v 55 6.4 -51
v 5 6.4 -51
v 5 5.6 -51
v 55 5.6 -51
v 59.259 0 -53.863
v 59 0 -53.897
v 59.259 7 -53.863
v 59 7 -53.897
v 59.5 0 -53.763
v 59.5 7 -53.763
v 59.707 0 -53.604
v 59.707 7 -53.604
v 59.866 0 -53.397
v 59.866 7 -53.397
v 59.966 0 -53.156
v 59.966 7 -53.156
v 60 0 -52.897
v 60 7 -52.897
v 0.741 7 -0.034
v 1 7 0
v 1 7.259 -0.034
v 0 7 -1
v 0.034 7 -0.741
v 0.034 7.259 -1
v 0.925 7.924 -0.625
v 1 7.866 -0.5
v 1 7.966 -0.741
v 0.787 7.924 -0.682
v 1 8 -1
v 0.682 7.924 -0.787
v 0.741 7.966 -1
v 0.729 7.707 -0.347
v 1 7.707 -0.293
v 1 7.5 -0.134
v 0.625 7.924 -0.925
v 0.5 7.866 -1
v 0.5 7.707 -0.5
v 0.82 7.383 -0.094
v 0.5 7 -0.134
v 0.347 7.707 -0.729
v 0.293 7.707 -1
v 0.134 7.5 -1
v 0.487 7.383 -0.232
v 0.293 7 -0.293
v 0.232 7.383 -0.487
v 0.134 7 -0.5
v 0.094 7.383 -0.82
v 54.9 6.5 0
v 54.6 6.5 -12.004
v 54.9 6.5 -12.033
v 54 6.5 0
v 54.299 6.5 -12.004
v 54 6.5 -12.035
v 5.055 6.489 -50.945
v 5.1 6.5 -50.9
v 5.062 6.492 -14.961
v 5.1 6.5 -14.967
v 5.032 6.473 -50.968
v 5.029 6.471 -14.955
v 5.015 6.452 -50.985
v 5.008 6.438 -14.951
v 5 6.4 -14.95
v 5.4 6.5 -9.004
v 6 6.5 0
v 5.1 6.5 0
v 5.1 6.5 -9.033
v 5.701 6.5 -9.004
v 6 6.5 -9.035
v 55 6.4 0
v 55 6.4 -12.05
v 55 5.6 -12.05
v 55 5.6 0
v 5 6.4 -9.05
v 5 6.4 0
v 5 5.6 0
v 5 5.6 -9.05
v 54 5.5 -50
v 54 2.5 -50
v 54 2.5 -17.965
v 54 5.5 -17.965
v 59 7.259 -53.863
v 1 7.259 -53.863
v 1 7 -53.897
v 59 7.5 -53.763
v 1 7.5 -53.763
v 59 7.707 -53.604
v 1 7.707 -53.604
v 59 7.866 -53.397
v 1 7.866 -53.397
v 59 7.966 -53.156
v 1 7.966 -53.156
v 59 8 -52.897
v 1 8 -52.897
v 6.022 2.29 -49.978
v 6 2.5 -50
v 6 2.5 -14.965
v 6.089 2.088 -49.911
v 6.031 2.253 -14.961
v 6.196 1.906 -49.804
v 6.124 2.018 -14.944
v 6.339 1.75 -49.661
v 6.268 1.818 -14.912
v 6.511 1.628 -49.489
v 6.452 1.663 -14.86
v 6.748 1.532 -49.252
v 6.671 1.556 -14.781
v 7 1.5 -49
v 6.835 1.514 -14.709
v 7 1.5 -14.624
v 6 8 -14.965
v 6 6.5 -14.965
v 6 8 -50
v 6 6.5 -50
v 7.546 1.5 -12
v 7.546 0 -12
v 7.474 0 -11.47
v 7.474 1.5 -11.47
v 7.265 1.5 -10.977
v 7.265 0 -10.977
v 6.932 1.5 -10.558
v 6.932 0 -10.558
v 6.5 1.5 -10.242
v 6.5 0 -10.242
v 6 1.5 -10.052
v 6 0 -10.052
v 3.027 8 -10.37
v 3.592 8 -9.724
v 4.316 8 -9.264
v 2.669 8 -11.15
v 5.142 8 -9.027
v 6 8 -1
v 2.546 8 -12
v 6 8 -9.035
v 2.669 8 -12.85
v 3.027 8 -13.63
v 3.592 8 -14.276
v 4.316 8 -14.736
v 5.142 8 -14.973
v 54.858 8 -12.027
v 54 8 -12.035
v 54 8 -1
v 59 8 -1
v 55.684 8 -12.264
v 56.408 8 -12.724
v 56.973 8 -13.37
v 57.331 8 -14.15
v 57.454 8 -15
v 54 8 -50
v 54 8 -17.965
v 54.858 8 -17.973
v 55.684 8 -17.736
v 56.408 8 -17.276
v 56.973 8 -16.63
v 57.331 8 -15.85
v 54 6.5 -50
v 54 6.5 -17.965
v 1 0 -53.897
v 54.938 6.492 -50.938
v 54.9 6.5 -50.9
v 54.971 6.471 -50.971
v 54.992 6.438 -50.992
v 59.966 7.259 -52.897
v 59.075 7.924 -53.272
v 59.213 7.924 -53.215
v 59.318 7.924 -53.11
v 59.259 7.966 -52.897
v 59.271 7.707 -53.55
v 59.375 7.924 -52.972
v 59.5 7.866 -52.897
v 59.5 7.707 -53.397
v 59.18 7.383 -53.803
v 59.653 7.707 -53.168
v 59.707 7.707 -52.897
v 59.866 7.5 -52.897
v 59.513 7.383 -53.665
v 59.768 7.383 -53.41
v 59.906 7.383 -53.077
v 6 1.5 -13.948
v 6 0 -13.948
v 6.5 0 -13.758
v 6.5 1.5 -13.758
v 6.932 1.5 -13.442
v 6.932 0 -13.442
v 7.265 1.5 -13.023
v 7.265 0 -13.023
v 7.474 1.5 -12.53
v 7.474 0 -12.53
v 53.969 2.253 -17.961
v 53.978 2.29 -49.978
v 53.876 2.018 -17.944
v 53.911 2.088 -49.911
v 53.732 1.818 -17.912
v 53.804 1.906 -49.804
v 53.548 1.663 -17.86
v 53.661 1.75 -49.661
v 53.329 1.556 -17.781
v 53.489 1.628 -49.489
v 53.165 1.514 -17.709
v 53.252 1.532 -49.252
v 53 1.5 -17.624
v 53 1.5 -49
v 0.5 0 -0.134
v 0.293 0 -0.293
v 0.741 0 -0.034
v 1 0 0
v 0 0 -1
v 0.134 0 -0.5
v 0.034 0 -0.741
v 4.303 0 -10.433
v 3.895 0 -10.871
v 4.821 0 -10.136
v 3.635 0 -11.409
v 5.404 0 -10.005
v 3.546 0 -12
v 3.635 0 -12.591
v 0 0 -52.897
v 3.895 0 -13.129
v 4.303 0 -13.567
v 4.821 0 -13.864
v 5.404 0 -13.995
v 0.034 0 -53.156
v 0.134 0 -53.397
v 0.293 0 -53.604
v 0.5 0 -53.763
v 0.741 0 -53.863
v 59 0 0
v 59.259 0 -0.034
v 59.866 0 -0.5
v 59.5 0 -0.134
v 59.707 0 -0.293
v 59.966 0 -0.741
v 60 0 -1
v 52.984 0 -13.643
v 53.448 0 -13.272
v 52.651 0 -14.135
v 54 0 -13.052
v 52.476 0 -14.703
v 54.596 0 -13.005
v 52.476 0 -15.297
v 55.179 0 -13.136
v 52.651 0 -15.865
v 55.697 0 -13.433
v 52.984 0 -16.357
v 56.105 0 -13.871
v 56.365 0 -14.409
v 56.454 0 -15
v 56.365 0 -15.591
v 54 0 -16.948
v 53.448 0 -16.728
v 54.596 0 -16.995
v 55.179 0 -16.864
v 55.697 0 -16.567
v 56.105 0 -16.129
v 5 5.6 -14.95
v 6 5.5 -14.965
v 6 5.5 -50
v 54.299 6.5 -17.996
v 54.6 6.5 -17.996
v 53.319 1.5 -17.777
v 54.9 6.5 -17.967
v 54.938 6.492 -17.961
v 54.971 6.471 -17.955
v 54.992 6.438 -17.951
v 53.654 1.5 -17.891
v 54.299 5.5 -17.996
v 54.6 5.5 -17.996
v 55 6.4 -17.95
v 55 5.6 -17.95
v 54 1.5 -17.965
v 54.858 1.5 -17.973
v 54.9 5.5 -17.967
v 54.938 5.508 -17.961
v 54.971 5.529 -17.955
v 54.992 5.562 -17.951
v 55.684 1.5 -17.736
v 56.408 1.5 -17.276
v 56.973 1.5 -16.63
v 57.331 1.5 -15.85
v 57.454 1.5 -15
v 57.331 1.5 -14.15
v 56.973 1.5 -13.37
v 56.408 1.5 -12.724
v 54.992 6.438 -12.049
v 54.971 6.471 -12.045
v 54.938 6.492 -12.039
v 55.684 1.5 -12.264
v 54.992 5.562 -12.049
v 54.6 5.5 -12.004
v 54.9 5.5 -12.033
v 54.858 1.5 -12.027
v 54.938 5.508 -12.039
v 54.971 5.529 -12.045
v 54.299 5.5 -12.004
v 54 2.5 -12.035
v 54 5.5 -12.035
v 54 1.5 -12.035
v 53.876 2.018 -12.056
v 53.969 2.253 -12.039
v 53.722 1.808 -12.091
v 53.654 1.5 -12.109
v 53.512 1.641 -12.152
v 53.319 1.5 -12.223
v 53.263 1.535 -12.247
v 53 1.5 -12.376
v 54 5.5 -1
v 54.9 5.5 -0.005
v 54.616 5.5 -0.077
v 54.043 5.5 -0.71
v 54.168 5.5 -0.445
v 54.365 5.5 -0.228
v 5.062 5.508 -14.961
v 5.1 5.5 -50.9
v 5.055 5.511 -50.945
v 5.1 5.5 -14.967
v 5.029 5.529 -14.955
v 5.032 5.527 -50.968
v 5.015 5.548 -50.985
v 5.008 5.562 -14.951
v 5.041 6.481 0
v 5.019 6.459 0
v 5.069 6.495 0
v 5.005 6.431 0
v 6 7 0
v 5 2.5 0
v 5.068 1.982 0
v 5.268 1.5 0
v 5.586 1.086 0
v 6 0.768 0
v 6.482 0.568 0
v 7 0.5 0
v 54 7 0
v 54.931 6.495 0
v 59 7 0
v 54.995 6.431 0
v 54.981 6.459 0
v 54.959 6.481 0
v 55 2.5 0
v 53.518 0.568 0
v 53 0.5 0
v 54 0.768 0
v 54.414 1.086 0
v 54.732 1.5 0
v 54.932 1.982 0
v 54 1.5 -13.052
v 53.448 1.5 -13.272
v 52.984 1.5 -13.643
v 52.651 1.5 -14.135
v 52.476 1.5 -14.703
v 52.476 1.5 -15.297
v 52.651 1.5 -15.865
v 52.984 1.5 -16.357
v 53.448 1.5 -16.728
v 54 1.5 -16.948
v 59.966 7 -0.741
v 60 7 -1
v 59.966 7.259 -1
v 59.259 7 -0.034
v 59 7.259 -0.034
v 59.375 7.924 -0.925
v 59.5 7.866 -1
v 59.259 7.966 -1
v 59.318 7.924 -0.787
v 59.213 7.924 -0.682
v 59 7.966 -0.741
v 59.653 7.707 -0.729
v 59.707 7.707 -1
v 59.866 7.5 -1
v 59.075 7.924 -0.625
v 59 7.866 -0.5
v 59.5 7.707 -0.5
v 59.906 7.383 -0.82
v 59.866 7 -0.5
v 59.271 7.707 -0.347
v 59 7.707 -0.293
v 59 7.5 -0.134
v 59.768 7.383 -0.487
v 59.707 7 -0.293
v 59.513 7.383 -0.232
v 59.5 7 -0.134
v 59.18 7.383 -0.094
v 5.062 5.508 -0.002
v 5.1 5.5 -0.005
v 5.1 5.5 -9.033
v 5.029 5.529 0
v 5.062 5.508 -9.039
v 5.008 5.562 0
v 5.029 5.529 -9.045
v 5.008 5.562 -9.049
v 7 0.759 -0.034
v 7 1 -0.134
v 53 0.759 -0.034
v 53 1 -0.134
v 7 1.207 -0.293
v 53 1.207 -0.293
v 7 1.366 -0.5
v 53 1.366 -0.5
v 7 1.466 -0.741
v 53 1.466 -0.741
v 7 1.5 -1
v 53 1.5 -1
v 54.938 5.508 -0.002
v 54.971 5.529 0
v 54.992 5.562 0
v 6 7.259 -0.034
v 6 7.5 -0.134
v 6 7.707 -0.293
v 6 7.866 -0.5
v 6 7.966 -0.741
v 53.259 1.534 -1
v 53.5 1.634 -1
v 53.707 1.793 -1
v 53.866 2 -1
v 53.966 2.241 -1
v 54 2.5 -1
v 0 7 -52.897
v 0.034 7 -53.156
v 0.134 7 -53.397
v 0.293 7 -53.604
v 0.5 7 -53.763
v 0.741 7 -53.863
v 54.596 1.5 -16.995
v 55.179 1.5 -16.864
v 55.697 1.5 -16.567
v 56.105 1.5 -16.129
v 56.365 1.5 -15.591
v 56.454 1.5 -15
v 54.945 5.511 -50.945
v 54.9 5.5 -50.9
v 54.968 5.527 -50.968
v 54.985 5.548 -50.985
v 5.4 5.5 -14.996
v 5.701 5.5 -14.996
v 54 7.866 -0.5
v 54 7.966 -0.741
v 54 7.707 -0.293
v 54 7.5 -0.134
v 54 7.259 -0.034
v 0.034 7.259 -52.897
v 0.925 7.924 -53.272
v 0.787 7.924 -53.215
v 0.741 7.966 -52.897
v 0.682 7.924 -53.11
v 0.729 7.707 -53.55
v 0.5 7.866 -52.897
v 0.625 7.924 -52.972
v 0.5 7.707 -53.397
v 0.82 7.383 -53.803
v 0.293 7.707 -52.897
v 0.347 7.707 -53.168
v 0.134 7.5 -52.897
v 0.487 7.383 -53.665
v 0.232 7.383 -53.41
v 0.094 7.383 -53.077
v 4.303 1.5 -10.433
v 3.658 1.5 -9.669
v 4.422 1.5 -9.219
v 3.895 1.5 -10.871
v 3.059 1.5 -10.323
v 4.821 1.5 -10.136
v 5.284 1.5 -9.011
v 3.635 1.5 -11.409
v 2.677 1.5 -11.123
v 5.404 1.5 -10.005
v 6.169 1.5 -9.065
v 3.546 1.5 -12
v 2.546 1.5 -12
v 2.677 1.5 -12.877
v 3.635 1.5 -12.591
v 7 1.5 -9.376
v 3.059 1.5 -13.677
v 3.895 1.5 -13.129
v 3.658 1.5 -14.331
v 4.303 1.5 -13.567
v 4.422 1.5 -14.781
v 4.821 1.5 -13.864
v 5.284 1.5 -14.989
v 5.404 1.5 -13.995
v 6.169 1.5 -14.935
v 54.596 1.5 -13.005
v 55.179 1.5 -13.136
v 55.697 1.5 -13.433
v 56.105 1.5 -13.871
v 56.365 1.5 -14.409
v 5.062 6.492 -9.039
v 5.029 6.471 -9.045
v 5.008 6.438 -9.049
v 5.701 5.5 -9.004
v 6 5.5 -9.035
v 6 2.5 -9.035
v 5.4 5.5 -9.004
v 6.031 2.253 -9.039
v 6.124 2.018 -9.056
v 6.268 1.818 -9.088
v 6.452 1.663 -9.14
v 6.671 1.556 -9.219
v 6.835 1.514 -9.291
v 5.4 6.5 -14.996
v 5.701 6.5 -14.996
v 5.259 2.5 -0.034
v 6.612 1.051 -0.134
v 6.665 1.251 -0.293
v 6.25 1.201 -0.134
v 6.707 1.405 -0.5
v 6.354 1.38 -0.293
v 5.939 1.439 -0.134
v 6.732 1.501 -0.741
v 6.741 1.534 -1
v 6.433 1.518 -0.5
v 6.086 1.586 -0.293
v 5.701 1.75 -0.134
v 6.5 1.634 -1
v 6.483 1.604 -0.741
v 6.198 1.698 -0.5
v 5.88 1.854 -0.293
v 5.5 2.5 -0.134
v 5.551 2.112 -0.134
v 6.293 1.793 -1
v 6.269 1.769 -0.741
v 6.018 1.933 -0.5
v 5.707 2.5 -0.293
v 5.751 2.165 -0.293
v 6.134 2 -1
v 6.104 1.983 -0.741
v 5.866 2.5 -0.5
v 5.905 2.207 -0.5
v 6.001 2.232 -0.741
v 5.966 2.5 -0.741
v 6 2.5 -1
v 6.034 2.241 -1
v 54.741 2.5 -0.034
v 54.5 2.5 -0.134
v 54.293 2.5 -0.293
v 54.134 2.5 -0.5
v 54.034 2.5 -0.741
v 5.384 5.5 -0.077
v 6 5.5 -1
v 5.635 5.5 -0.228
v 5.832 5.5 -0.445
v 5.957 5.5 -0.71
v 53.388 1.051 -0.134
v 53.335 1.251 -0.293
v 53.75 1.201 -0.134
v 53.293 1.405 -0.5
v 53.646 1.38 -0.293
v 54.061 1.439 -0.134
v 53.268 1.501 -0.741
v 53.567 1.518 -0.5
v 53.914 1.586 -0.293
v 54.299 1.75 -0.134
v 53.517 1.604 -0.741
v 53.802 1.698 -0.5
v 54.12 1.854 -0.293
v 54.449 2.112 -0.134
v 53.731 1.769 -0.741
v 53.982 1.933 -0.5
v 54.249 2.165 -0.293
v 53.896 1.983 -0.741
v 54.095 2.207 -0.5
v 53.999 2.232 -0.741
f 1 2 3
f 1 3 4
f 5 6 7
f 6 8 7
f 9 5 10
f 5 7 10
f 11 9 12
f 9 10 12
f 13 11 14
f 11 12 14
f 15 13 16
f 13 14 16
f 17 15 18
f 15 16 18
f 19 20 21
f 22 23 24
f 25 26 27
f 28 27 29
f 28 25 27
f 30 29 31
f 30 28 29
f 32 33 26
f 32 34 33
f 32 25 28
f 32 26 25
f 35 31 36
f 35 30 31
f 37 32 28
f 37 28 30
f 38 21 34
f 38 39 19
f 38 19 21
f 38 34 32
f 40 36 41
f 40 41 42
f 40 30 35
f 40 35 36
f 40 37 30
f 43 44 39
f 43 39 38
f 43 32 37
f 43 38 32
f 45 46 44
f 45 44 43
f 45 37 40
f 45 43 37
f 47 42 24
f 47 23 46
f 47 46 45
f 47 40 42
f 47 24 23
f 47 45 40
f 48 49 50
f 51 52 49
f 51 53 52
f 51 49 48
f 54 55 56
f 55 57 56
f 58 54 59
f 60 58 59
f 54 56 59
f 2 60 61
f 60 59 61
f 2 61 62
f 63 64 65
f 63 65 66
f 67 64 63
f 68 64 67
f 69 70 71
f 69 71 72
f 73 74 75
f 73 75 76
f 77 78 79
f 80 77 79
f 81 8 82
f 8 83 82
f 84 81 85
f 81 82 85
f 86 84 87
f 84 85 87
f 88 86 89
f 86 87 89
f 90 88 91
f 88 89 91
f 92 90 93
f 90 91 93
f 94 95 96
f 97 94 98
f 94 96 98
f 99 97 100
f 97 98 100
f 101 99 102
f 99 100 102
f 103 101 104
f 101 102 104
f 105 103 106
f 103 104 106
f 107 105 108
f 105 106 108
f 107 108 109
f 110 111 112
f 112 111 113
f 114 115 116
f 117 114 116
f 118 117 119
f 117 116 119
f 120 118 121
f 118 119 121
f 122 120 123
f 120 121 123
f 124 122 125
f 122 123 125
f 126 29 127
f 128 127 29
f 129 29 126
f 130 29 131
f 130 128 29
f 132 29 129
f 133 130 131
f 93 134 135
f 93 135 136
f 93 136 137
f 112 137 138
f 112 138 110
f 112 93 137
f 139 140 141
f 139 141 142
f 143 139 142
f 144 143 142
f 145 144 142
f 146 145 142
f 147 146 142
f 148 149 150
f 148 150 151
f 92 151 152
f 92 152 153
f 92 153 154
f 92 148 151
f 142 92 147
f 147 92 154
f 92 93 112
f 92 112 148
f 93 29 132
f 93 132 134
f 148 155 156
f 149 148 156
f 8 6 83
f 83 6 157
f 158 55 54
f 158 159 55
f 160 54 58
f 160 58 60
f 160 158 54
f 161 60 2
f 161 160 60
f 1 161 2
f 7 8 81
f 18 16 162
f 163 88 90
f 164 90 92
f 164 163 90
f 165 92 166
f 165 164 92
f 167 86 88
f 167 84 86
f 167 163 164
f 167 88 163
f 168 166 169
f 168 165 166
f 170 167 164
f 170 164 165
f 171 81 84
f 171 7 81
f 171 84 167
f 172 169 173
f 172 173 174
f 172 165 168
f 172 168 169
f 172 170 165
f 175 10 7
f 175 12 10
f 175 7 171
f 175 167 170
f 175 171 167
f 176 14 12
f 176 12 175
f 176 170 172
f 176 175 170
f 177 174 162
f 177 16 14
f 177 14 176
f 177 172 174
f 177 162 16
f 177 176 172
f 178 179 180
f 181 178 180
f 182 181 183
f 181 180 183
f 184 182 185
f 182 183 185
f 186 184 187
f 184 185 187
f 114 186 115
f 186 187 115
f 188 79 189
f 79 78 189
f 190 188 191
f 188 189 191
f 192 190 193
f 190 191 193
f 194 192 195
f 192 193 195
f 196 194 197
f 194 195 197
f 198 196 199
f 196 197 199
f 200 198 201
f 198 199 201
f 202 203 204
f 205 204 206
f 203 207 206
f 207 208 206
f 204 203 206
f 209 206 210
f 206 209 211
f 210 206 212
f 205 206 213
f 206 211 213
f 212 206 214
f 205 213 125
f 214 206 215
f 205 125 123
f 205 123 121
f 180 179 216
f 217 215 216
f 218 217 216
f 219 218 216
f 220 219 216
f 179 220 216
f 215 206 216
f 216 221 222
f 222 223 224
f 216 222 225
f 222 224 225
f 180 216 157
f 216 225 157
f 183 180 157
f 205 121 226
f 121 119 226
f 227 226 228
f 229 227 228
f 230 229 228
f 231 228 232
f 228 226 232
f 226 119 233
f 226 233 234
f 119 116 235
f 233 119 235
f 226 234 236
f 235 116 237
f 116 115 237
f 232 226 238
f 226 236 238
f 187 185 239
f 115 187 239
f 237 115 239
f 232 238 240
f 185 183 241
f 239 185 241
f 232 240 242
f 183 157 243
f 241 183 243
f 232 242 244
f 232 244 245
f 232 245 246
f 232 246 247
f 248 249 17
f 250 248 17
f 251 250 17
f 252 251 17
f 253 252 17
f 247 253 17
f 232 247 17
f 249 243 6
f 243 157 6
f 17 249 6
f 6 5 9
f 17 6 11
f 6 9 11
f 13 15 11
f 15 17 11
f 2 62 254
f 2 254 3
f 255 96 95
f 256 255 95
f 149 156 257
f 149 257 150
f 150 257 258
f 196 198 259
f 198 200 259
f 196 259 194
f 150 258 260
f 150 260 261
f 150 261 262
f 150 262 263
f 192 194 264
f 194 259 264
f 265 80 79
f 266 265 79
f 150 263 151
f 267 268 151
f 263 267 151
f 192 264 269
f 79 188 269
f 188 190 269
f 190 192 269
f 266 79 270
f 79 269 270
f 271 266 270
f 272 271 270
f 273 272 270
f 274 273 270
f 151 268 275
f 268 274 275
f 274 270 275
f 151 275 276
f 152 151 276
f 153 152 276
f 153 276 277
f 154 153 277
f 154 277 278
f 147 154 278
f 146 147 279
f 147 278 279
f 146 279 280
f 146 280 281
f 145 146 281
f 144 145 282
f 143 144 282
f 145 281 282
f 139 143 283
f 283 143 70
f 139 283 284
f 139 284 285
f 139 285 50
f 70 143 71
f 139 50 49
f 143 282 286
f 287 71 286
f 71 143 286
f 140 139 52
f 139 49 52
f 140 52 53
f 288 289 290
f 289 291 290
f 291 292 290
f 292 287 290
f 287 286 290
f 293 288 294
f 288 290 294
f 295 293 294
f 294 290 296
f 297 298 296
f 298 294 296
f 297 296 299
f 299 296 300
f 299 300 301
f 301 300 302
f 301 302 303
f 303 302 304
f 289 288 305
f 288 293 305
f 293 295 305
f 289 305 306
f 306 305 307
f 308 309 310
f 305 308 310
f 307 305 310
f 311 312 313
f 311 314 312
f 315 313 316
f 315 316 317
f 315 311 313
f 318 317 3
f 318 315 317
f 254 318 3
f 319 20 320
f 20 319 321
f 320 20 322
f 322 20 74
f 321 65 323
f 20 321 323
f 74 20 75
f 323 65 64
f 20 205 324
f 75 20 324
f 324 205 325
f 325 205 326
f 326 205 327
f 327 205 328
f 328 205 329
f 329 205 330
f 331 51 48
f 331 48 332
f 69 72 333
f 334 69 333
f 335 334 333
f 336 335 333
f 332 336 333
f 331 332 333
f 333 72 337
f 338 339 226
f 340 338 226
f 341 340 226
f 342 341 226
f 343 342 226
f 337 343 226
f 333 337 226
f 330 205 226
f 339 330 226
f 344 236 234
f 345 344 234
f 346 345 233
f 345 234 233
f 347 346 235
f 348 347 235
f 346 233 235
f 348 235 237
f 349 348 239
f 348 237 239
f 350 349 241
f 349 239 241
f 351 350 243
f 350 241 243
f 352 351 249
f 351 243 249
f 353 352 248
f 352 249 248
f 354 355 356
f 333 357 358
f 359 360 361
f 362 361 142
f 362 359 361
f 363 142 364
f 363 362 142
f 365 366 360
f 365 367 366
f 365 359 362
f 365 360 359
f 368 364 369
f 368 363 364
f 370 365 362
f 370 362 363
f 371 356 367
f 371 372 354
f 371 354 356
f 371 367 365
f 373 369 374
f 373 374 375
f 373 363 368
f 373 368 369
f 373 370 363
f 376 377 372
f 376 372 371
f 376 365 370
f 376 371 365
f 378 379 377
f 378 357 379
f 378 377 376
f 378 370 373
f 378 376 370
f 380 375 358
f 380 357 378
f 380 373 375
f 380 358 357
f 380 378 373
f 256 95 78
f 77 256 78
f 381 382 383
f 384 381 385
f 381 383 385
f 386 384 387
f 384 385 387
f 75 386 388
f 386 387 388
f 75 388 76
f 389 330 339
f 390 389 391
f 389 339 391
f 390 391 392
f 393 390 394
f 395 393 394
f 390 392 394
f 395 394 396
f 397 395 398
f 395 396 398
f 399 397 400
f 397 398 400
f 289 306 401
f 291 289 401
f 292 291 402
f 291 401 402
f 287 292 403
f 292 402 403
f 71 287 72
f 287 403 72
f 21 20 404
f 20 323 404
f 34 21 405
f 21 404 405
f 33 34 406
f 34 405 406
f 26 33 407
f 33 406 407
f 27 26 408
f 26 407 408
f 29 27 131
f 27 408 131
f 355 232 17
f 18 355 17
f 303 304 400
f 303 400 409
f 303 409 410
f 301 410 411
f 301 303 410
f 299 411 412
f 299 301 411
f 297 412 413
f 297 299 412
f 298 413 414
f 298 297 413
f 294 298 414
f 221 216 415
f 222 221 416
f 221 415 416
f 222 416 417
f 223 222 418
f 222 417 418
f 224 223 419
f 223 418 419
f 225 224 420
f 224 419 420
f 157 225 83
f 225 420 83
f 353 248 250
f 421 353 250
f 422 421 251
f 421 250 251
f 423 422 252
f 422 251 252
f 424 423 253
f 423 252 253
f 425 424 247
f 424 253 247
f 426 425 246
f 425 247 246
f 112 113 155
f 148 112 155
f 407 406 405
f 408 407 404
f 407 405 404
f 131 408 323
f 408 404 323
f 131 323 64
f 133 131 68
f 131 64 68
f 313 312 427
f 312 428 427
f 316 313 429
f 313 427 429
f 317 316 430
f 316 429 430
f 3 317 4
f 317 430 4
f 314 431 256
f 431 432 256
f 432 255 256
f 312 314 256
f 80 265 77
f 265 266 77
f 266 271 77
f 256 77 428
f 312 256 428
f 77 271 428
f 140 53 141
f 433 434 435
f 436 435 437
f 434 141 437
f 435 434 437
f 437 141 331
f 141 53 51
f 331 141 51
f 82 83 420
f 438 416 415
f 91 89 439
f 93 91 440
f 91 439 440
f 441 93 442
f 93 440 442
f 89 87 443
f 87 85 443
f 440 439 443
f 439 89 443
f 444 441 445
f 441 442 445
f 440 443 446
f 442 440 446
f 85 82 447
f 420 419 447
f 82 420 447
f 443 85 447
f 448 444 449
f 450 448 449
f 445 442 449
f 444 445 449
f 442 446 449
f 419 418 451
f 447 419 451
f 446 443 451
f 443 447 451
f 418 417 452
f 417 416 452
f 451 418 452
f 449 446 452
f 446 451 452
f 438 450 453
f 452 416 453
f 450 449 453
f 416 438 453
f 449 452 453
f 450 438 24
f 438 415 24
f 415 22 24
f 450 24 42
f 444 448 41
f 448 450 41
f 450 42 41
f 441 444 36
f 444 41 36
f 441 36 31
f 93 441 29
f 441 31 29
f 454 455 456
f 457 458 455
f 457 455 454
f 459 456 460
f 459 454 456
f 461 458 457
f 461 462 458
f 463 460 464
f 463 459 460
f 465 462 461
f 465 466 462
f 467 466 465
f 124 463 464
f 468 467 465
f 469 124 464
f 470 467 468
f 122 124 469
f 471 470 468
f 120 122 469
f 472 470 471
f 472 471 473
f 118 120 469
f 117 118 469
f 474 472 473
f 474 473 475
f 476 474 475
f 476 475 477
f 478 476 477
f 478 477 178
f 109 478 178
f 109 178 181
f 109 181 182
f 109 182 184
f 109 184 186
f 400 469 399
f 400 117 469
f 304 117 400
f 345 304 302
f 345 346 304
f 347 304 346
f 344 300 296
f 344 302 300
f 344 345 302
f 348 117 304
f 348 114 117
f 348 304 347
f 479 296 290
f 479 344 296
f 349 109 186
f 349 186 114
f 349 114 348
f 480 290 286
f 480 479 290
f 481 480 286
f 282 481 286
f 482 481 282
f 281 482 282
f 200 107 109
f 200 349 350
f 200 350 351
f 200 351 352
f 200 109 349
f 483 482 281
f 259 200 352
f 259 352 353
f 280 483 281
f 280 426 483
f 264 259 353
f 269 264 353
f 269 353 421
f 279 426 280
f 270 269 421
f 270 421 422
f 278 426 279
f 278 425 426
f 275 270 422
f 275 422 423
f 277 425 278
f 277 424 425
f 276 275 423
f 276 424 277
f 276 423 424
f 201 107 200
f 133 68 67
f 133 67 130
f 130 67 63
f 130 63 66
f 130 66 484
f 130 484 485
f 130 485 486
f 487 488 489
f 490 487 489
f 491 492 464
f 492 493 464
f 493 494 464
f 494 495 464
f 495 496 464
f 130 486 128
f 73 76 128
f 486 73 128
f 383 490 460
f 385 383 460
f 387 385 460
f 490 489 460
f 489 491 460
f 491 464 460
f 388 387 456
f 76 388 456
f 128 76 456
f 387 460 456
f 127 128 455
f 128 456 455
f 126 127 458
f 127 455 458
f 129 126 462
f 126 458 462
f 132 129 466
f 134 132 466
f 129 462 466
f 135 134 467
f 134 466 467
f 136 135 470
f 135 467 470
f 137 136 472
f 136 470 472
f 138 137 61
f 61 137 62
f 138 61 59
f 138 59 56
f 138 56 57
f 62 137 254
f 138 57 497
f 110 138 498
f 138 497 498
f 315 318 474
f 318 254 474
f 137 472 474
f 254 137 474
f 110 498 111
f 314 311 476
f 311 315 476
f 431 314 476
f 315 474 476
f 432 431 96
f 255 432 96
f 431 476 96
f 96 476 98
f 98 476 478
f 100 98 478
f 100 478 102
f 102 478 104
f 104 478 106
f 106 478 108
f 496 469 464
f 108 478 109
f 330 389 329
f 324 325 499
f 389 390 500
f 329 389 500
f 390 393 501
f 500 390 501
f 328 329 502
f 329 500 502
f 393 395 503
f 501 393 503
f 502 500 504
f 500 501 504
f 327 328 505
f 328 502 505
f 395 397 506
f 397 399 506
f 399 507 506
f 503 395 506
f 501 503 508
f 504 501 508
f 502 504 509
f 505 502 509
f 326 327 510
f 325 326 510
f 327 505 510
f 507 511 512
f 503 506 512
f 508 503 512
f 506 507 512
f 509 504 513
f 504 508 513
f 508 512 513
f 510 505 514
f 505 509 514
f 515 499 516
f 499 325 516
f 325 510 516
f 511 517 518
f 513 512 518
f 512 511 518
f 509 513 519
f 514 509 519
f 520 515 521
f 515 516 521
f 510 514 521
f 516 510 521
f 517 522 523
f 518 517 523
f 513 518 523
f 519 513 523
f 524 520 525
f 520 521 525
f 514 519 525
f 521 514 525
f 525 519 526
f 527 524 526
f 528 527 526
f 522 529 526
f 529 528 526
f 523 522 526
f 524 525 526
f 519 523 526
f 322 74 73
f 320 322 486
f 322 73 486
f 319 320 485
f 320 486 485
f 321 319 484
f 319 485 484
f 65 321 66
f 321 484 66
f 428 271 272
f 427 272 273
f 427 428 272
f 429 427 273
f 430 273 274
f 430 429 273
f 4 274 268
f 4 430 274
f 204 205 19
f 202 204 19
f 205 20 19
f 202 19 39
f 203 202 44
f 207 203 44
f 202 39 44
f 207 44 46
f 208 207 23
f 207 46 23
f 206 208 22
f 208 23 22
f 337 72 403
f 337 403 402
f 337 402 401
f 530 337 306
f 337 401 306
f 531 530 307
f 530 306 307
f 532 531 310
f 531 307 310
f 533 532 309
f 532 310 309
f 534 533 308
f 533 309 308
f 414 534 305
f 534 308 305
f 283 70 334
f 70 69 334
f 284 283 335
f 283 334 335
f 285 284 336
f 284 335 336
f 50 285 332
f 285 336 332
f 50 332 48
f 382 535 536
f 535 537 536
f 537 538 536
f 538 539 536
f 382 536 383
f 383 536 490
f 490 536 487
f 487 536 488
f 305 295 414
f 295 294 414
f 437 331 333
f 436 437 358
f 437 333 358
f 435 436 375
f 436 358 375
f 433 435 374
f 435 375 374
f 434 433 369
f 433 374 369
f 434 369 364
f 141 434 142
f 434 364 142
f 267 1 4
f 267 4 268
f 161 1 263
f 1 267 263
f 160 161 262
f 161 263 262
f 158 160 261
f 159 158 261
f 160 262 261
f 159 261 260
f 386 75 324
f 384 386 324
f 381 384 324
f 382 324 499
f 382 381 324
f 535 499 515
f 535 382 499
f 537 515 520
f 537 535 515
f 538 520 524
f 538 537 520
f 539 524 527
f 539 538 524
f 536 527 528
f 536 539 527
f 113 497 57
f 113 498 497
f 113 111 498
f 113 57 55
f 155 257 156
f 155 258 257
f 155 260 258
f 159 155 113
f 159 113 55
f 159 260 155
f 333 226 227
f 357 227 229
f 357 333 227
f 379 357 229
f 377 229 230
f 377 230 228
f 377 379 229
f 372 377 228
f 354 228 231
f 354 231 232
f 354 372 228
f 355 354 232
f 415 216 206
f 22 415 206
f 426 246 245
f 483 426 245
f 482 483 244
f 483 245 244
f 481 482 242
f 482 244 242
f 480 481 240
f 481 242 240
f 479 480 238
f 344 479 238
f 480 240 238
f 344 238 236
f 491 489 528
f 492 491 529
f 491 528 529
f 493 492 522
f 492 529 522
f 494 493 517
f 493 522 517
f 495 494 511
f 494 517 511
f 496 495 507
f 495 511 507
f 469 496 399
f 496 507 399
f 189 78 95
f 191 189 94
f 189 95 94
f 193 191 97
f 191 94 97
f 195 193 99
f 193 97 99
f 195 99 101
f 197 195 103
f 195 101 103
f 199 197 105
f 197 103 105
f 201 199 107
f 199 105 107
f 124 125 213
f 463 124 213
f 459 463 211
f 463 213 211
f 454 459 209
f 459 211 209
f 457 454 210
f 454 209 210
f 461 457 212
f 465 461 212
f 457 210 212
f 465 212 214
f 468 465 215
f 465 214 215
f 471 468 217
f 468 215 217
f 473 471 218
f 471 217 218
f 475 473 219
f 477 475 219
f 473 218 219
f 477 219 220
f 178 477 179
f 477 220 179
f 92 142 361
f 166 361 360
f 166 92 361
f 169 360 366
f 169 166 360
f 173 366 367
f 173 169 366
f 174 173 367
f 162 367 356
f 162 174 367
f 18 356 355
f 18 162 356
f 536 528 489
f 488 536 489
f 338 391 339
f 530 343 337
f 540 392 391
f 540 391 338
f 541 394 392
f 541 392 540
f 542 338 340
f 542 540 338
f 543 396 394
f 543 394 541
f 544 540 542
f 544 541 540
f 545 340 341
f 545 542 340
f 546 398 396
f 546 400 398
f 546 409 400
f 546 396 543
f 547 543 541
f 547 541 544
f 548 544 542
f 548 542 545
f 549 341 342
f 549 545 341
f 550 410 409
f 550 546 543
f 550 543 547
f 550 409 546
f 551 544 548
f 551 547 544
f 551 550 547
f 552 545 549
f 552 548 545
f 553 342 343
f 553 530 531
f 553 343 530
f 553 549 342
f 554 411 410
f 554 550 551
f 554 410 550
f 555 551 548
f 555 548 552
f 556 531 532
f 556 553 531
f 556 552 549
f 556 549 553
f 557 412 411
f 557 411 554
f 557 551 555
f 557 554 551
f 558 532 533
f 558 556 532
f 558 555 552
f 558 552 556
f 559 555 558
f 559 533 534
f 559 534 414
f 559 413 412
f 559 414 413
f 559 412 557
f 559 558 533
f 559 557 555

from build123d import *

# Parameters (mm, degrees)
BOSS_EXTRUDE1_DEPTH = 1.5
BOSS_EXTRUDE4_DEPTH = 8
SKETCH6_W           = 50
SKETCH6_H           = 1
CUT_EXTRUDE1_DEPTH  = 1
SKETCH10_W          = 50
SKETCH10_H          = 1
CUT_EXTRUDE2_DEPTH  = 1
SKETCH11_W          = 50
SKETCH11_H          = 1
CUT_EXTRUDE3_DEPTH  = 1
FILLET1_R           = 1
FILLET2_R           = 0.1


with BuildPart() as part:
    # Sketch2 → Boss-Extrude1 (new body)
    with BuildSketch(Plane(origin=(0, 0, 0), x_dir=(1, 0, 0), z_dir=(0, 1, 0))):
        with BuildLine():
            Line((6, 9.034557534), (6, 0))
            Line((6, 0), (54, 0))
            Line((54, 0), (54, 12.034557534))
            ThreePointArc((54, 12.034557534), (51.454038521, 15), (54, 17.965442466))
            Line((54, 17.965442466), (54, 50))
            Line((54, 50), (6, 50))
            Line((6, 50), (6, 14.965442466))
            ThreePointArc((6, 14.965442466), (7.822155184, 13.954211406), (8.545961479, 12))
            ThreePointArc((8.545961479, 12), (7.822155184, 10.045788594), (6, 9.034557534))
        make_face()
        with BuildLine():
            ThreePointArc((54, 17.965442466), (51.454038521, 15), (54, 12.034557534))
            Line((54, 12.034557534), (54, 13.052219463))
            ThreePointArc((54, 13.052219463), (52.454038521, 15), (54, 16.947780537))
            Line((54, 16.947780537), (54, 17.965442466))
        make_face()
        with BuildLine():
            Line((54, 13.052219463), (54, 12.034557534))
            ThreePointArc((54, 12.034557534), (56.408249927, 12.723806295), (57.454038521, 15))
            ThreePointArc((57.454038521, 15), (56.408249927, 17.276193705), (54, 17.965442466))
            Line((54, 17.965442466), (54, 16.947780537))
            ThreePointArc((54, 16.947780537), (55.697405514, 16.566537111), (56.454038521, 15))
            ThreePointArc((56.454038521, 15), (55.697405514, 13.433462889), (54, 13.052219463))
        make_face()
        with BuildLine():
            ThreePointArc((6, 14.965442466), (2.545961479, 12), (6, 9.034557534))
            Line((6, 9.034557534), (6, 10.052219463))
            ThreePointArc((6, 10.052219463), (3.545961479, 12), (6, 13.947780537))
            Line((6, 13.947780537), (6, 14.965442466))
        make_face()
        with BuildLine():
            Line((6, 10.052219463), (6, 9.034557534))
            ThreePointArc((6, 9.034557534), (7.822155184, 10.045788594), (8.545961479, 12))
            ThreePointArc((8.545961479, 12), (7.822155184, 13.954211406), (6, 14.965442466))
            Line((6, 14.965442466), (6, 13.947780537))
            ThreePointArc((6, 13.947780537), (7.11249859, 13.243366993), (7.545961479, 12))
            ThreePointArc((7.545961479, 12), (7.11249859, 10.756633007), (6, 10.052219463))
        make_face()
    extrude(amount=BOSS_EXTRUDE1_DEPTH)

    # Sketch2<7> → Boss-Extrude4 (add)
    with BuildSketch(Plane(origin=(0, 0, 0), x_dir=(1, 0, 0), z_dir=(0, 1, 0))):
        with BuildLine():
            Line((0, 0), (6, 0))
            Line((6, 0), (6, 9.034557534))
            ThreePointArc((6, 9.034557534), (2.545961479, 12), (6, 14.965442466))
            Line((6, 14.965442466), (6, 50))
            Line((6, 50), (54, 50))
            Line((54, 50), (54, 17.965442466))
            ThreePointArc((54, 17.965442466), (57.454038521, 15), (54, 12.034557534))
            Line((54, 12.034557534), (54, 0))
            Line((54, 0), (60, 0))
            Line((60, 0), (60, 53.896997513))
            Line((60, 53.896997513), (0, 53.896997513))
            Line((0, 53.896997513), (0, 0))
        make_face()
    extrude(amount=BOSS_EXTRUDE4_DEPTH)

    # Sketch6 → Cut-Extrude1 (cut)
    with BuildSketch(Plane(origin=(6, 0, 0), x_dir=(0, 0, -1), z_dir=(1, 0, 0))):
        with Locations((25, 6)):
            Rectangle(SKETCH6_W, SKETCH6_H)
    extrude(amount=-CUT_EXTRUDE1_DEPTH, mode=Mode.SUBTRACT)

    # Sketch10 → Cut-Extrude2 (cut)
    with BuildSketch(Plane.ZY.offset(-54)):
        with Locations((-25, 6)):
            Rectangle(SKETCH10_W, SKETCH10_H)
    extrude(amount=-CUT_EXTRUDE2_DEPTH, mode=Mode.SUBTRACT)

    # Sketch11 → Cut-Extrude3 (cut)
    with BuildSketch(Plane.XY.offset(-50)):
        with Locations((30, 6)):
            Rectangle(SKETCH11_W, SKETCH11_H)
    extrude(amount=-CUT_EXTRUDE3_DEPTH, mode=Mode.SUBTRACT)

    # Fillet1
    fillet1_edges = [part.edges().sort_by_distance(p)[0] for p in [
        (6, 1.5, -4.517278767),
        (6, 1.5, -32.482721233),
        (30, 1.5, -50),
        (54, 1.5, -33.982721233),
        (54, 1.5, -6.017278767),
        (30, 1.5, 0),
        (54, 3.5, 0),
        (6, 3.5, 0),
        (60, 4, -53.896997513),
        (0, 4, -53.896997513),
        (30, 8, -53.896997513),
        (0, 4, 0),
        (60, 4, 0),
        (60, 8, -26.948498756),
        (57, 8, 0),
        (3, 8, 0),
        (0, 8, -26.948498756),
    ]]
    fillet(fillet1_edges, radius=FILLET1_R)

    # Fillet2
    fillet2_edges = [part.edges().sort_by_distance(p)[0] for p in [
        (55, 6.5, -34.474951361),
        (55, 5.5, -6.025048639),
        (55, 6.5, -6.025048639),
        (55, 5.5, -34.474951361),
        (30, 6.5, -51),
        (30, 5.5, -51),
        (5, 6.5, -32.974951361),
        (5, 5.5, -4.525048639),
        (5, 6.5, -4.525048639),
        (5, 5.5, -32.974951361),
    ]]
    fillet(fillet2_edges, radius=FILLET2_R)


solid = part.part
